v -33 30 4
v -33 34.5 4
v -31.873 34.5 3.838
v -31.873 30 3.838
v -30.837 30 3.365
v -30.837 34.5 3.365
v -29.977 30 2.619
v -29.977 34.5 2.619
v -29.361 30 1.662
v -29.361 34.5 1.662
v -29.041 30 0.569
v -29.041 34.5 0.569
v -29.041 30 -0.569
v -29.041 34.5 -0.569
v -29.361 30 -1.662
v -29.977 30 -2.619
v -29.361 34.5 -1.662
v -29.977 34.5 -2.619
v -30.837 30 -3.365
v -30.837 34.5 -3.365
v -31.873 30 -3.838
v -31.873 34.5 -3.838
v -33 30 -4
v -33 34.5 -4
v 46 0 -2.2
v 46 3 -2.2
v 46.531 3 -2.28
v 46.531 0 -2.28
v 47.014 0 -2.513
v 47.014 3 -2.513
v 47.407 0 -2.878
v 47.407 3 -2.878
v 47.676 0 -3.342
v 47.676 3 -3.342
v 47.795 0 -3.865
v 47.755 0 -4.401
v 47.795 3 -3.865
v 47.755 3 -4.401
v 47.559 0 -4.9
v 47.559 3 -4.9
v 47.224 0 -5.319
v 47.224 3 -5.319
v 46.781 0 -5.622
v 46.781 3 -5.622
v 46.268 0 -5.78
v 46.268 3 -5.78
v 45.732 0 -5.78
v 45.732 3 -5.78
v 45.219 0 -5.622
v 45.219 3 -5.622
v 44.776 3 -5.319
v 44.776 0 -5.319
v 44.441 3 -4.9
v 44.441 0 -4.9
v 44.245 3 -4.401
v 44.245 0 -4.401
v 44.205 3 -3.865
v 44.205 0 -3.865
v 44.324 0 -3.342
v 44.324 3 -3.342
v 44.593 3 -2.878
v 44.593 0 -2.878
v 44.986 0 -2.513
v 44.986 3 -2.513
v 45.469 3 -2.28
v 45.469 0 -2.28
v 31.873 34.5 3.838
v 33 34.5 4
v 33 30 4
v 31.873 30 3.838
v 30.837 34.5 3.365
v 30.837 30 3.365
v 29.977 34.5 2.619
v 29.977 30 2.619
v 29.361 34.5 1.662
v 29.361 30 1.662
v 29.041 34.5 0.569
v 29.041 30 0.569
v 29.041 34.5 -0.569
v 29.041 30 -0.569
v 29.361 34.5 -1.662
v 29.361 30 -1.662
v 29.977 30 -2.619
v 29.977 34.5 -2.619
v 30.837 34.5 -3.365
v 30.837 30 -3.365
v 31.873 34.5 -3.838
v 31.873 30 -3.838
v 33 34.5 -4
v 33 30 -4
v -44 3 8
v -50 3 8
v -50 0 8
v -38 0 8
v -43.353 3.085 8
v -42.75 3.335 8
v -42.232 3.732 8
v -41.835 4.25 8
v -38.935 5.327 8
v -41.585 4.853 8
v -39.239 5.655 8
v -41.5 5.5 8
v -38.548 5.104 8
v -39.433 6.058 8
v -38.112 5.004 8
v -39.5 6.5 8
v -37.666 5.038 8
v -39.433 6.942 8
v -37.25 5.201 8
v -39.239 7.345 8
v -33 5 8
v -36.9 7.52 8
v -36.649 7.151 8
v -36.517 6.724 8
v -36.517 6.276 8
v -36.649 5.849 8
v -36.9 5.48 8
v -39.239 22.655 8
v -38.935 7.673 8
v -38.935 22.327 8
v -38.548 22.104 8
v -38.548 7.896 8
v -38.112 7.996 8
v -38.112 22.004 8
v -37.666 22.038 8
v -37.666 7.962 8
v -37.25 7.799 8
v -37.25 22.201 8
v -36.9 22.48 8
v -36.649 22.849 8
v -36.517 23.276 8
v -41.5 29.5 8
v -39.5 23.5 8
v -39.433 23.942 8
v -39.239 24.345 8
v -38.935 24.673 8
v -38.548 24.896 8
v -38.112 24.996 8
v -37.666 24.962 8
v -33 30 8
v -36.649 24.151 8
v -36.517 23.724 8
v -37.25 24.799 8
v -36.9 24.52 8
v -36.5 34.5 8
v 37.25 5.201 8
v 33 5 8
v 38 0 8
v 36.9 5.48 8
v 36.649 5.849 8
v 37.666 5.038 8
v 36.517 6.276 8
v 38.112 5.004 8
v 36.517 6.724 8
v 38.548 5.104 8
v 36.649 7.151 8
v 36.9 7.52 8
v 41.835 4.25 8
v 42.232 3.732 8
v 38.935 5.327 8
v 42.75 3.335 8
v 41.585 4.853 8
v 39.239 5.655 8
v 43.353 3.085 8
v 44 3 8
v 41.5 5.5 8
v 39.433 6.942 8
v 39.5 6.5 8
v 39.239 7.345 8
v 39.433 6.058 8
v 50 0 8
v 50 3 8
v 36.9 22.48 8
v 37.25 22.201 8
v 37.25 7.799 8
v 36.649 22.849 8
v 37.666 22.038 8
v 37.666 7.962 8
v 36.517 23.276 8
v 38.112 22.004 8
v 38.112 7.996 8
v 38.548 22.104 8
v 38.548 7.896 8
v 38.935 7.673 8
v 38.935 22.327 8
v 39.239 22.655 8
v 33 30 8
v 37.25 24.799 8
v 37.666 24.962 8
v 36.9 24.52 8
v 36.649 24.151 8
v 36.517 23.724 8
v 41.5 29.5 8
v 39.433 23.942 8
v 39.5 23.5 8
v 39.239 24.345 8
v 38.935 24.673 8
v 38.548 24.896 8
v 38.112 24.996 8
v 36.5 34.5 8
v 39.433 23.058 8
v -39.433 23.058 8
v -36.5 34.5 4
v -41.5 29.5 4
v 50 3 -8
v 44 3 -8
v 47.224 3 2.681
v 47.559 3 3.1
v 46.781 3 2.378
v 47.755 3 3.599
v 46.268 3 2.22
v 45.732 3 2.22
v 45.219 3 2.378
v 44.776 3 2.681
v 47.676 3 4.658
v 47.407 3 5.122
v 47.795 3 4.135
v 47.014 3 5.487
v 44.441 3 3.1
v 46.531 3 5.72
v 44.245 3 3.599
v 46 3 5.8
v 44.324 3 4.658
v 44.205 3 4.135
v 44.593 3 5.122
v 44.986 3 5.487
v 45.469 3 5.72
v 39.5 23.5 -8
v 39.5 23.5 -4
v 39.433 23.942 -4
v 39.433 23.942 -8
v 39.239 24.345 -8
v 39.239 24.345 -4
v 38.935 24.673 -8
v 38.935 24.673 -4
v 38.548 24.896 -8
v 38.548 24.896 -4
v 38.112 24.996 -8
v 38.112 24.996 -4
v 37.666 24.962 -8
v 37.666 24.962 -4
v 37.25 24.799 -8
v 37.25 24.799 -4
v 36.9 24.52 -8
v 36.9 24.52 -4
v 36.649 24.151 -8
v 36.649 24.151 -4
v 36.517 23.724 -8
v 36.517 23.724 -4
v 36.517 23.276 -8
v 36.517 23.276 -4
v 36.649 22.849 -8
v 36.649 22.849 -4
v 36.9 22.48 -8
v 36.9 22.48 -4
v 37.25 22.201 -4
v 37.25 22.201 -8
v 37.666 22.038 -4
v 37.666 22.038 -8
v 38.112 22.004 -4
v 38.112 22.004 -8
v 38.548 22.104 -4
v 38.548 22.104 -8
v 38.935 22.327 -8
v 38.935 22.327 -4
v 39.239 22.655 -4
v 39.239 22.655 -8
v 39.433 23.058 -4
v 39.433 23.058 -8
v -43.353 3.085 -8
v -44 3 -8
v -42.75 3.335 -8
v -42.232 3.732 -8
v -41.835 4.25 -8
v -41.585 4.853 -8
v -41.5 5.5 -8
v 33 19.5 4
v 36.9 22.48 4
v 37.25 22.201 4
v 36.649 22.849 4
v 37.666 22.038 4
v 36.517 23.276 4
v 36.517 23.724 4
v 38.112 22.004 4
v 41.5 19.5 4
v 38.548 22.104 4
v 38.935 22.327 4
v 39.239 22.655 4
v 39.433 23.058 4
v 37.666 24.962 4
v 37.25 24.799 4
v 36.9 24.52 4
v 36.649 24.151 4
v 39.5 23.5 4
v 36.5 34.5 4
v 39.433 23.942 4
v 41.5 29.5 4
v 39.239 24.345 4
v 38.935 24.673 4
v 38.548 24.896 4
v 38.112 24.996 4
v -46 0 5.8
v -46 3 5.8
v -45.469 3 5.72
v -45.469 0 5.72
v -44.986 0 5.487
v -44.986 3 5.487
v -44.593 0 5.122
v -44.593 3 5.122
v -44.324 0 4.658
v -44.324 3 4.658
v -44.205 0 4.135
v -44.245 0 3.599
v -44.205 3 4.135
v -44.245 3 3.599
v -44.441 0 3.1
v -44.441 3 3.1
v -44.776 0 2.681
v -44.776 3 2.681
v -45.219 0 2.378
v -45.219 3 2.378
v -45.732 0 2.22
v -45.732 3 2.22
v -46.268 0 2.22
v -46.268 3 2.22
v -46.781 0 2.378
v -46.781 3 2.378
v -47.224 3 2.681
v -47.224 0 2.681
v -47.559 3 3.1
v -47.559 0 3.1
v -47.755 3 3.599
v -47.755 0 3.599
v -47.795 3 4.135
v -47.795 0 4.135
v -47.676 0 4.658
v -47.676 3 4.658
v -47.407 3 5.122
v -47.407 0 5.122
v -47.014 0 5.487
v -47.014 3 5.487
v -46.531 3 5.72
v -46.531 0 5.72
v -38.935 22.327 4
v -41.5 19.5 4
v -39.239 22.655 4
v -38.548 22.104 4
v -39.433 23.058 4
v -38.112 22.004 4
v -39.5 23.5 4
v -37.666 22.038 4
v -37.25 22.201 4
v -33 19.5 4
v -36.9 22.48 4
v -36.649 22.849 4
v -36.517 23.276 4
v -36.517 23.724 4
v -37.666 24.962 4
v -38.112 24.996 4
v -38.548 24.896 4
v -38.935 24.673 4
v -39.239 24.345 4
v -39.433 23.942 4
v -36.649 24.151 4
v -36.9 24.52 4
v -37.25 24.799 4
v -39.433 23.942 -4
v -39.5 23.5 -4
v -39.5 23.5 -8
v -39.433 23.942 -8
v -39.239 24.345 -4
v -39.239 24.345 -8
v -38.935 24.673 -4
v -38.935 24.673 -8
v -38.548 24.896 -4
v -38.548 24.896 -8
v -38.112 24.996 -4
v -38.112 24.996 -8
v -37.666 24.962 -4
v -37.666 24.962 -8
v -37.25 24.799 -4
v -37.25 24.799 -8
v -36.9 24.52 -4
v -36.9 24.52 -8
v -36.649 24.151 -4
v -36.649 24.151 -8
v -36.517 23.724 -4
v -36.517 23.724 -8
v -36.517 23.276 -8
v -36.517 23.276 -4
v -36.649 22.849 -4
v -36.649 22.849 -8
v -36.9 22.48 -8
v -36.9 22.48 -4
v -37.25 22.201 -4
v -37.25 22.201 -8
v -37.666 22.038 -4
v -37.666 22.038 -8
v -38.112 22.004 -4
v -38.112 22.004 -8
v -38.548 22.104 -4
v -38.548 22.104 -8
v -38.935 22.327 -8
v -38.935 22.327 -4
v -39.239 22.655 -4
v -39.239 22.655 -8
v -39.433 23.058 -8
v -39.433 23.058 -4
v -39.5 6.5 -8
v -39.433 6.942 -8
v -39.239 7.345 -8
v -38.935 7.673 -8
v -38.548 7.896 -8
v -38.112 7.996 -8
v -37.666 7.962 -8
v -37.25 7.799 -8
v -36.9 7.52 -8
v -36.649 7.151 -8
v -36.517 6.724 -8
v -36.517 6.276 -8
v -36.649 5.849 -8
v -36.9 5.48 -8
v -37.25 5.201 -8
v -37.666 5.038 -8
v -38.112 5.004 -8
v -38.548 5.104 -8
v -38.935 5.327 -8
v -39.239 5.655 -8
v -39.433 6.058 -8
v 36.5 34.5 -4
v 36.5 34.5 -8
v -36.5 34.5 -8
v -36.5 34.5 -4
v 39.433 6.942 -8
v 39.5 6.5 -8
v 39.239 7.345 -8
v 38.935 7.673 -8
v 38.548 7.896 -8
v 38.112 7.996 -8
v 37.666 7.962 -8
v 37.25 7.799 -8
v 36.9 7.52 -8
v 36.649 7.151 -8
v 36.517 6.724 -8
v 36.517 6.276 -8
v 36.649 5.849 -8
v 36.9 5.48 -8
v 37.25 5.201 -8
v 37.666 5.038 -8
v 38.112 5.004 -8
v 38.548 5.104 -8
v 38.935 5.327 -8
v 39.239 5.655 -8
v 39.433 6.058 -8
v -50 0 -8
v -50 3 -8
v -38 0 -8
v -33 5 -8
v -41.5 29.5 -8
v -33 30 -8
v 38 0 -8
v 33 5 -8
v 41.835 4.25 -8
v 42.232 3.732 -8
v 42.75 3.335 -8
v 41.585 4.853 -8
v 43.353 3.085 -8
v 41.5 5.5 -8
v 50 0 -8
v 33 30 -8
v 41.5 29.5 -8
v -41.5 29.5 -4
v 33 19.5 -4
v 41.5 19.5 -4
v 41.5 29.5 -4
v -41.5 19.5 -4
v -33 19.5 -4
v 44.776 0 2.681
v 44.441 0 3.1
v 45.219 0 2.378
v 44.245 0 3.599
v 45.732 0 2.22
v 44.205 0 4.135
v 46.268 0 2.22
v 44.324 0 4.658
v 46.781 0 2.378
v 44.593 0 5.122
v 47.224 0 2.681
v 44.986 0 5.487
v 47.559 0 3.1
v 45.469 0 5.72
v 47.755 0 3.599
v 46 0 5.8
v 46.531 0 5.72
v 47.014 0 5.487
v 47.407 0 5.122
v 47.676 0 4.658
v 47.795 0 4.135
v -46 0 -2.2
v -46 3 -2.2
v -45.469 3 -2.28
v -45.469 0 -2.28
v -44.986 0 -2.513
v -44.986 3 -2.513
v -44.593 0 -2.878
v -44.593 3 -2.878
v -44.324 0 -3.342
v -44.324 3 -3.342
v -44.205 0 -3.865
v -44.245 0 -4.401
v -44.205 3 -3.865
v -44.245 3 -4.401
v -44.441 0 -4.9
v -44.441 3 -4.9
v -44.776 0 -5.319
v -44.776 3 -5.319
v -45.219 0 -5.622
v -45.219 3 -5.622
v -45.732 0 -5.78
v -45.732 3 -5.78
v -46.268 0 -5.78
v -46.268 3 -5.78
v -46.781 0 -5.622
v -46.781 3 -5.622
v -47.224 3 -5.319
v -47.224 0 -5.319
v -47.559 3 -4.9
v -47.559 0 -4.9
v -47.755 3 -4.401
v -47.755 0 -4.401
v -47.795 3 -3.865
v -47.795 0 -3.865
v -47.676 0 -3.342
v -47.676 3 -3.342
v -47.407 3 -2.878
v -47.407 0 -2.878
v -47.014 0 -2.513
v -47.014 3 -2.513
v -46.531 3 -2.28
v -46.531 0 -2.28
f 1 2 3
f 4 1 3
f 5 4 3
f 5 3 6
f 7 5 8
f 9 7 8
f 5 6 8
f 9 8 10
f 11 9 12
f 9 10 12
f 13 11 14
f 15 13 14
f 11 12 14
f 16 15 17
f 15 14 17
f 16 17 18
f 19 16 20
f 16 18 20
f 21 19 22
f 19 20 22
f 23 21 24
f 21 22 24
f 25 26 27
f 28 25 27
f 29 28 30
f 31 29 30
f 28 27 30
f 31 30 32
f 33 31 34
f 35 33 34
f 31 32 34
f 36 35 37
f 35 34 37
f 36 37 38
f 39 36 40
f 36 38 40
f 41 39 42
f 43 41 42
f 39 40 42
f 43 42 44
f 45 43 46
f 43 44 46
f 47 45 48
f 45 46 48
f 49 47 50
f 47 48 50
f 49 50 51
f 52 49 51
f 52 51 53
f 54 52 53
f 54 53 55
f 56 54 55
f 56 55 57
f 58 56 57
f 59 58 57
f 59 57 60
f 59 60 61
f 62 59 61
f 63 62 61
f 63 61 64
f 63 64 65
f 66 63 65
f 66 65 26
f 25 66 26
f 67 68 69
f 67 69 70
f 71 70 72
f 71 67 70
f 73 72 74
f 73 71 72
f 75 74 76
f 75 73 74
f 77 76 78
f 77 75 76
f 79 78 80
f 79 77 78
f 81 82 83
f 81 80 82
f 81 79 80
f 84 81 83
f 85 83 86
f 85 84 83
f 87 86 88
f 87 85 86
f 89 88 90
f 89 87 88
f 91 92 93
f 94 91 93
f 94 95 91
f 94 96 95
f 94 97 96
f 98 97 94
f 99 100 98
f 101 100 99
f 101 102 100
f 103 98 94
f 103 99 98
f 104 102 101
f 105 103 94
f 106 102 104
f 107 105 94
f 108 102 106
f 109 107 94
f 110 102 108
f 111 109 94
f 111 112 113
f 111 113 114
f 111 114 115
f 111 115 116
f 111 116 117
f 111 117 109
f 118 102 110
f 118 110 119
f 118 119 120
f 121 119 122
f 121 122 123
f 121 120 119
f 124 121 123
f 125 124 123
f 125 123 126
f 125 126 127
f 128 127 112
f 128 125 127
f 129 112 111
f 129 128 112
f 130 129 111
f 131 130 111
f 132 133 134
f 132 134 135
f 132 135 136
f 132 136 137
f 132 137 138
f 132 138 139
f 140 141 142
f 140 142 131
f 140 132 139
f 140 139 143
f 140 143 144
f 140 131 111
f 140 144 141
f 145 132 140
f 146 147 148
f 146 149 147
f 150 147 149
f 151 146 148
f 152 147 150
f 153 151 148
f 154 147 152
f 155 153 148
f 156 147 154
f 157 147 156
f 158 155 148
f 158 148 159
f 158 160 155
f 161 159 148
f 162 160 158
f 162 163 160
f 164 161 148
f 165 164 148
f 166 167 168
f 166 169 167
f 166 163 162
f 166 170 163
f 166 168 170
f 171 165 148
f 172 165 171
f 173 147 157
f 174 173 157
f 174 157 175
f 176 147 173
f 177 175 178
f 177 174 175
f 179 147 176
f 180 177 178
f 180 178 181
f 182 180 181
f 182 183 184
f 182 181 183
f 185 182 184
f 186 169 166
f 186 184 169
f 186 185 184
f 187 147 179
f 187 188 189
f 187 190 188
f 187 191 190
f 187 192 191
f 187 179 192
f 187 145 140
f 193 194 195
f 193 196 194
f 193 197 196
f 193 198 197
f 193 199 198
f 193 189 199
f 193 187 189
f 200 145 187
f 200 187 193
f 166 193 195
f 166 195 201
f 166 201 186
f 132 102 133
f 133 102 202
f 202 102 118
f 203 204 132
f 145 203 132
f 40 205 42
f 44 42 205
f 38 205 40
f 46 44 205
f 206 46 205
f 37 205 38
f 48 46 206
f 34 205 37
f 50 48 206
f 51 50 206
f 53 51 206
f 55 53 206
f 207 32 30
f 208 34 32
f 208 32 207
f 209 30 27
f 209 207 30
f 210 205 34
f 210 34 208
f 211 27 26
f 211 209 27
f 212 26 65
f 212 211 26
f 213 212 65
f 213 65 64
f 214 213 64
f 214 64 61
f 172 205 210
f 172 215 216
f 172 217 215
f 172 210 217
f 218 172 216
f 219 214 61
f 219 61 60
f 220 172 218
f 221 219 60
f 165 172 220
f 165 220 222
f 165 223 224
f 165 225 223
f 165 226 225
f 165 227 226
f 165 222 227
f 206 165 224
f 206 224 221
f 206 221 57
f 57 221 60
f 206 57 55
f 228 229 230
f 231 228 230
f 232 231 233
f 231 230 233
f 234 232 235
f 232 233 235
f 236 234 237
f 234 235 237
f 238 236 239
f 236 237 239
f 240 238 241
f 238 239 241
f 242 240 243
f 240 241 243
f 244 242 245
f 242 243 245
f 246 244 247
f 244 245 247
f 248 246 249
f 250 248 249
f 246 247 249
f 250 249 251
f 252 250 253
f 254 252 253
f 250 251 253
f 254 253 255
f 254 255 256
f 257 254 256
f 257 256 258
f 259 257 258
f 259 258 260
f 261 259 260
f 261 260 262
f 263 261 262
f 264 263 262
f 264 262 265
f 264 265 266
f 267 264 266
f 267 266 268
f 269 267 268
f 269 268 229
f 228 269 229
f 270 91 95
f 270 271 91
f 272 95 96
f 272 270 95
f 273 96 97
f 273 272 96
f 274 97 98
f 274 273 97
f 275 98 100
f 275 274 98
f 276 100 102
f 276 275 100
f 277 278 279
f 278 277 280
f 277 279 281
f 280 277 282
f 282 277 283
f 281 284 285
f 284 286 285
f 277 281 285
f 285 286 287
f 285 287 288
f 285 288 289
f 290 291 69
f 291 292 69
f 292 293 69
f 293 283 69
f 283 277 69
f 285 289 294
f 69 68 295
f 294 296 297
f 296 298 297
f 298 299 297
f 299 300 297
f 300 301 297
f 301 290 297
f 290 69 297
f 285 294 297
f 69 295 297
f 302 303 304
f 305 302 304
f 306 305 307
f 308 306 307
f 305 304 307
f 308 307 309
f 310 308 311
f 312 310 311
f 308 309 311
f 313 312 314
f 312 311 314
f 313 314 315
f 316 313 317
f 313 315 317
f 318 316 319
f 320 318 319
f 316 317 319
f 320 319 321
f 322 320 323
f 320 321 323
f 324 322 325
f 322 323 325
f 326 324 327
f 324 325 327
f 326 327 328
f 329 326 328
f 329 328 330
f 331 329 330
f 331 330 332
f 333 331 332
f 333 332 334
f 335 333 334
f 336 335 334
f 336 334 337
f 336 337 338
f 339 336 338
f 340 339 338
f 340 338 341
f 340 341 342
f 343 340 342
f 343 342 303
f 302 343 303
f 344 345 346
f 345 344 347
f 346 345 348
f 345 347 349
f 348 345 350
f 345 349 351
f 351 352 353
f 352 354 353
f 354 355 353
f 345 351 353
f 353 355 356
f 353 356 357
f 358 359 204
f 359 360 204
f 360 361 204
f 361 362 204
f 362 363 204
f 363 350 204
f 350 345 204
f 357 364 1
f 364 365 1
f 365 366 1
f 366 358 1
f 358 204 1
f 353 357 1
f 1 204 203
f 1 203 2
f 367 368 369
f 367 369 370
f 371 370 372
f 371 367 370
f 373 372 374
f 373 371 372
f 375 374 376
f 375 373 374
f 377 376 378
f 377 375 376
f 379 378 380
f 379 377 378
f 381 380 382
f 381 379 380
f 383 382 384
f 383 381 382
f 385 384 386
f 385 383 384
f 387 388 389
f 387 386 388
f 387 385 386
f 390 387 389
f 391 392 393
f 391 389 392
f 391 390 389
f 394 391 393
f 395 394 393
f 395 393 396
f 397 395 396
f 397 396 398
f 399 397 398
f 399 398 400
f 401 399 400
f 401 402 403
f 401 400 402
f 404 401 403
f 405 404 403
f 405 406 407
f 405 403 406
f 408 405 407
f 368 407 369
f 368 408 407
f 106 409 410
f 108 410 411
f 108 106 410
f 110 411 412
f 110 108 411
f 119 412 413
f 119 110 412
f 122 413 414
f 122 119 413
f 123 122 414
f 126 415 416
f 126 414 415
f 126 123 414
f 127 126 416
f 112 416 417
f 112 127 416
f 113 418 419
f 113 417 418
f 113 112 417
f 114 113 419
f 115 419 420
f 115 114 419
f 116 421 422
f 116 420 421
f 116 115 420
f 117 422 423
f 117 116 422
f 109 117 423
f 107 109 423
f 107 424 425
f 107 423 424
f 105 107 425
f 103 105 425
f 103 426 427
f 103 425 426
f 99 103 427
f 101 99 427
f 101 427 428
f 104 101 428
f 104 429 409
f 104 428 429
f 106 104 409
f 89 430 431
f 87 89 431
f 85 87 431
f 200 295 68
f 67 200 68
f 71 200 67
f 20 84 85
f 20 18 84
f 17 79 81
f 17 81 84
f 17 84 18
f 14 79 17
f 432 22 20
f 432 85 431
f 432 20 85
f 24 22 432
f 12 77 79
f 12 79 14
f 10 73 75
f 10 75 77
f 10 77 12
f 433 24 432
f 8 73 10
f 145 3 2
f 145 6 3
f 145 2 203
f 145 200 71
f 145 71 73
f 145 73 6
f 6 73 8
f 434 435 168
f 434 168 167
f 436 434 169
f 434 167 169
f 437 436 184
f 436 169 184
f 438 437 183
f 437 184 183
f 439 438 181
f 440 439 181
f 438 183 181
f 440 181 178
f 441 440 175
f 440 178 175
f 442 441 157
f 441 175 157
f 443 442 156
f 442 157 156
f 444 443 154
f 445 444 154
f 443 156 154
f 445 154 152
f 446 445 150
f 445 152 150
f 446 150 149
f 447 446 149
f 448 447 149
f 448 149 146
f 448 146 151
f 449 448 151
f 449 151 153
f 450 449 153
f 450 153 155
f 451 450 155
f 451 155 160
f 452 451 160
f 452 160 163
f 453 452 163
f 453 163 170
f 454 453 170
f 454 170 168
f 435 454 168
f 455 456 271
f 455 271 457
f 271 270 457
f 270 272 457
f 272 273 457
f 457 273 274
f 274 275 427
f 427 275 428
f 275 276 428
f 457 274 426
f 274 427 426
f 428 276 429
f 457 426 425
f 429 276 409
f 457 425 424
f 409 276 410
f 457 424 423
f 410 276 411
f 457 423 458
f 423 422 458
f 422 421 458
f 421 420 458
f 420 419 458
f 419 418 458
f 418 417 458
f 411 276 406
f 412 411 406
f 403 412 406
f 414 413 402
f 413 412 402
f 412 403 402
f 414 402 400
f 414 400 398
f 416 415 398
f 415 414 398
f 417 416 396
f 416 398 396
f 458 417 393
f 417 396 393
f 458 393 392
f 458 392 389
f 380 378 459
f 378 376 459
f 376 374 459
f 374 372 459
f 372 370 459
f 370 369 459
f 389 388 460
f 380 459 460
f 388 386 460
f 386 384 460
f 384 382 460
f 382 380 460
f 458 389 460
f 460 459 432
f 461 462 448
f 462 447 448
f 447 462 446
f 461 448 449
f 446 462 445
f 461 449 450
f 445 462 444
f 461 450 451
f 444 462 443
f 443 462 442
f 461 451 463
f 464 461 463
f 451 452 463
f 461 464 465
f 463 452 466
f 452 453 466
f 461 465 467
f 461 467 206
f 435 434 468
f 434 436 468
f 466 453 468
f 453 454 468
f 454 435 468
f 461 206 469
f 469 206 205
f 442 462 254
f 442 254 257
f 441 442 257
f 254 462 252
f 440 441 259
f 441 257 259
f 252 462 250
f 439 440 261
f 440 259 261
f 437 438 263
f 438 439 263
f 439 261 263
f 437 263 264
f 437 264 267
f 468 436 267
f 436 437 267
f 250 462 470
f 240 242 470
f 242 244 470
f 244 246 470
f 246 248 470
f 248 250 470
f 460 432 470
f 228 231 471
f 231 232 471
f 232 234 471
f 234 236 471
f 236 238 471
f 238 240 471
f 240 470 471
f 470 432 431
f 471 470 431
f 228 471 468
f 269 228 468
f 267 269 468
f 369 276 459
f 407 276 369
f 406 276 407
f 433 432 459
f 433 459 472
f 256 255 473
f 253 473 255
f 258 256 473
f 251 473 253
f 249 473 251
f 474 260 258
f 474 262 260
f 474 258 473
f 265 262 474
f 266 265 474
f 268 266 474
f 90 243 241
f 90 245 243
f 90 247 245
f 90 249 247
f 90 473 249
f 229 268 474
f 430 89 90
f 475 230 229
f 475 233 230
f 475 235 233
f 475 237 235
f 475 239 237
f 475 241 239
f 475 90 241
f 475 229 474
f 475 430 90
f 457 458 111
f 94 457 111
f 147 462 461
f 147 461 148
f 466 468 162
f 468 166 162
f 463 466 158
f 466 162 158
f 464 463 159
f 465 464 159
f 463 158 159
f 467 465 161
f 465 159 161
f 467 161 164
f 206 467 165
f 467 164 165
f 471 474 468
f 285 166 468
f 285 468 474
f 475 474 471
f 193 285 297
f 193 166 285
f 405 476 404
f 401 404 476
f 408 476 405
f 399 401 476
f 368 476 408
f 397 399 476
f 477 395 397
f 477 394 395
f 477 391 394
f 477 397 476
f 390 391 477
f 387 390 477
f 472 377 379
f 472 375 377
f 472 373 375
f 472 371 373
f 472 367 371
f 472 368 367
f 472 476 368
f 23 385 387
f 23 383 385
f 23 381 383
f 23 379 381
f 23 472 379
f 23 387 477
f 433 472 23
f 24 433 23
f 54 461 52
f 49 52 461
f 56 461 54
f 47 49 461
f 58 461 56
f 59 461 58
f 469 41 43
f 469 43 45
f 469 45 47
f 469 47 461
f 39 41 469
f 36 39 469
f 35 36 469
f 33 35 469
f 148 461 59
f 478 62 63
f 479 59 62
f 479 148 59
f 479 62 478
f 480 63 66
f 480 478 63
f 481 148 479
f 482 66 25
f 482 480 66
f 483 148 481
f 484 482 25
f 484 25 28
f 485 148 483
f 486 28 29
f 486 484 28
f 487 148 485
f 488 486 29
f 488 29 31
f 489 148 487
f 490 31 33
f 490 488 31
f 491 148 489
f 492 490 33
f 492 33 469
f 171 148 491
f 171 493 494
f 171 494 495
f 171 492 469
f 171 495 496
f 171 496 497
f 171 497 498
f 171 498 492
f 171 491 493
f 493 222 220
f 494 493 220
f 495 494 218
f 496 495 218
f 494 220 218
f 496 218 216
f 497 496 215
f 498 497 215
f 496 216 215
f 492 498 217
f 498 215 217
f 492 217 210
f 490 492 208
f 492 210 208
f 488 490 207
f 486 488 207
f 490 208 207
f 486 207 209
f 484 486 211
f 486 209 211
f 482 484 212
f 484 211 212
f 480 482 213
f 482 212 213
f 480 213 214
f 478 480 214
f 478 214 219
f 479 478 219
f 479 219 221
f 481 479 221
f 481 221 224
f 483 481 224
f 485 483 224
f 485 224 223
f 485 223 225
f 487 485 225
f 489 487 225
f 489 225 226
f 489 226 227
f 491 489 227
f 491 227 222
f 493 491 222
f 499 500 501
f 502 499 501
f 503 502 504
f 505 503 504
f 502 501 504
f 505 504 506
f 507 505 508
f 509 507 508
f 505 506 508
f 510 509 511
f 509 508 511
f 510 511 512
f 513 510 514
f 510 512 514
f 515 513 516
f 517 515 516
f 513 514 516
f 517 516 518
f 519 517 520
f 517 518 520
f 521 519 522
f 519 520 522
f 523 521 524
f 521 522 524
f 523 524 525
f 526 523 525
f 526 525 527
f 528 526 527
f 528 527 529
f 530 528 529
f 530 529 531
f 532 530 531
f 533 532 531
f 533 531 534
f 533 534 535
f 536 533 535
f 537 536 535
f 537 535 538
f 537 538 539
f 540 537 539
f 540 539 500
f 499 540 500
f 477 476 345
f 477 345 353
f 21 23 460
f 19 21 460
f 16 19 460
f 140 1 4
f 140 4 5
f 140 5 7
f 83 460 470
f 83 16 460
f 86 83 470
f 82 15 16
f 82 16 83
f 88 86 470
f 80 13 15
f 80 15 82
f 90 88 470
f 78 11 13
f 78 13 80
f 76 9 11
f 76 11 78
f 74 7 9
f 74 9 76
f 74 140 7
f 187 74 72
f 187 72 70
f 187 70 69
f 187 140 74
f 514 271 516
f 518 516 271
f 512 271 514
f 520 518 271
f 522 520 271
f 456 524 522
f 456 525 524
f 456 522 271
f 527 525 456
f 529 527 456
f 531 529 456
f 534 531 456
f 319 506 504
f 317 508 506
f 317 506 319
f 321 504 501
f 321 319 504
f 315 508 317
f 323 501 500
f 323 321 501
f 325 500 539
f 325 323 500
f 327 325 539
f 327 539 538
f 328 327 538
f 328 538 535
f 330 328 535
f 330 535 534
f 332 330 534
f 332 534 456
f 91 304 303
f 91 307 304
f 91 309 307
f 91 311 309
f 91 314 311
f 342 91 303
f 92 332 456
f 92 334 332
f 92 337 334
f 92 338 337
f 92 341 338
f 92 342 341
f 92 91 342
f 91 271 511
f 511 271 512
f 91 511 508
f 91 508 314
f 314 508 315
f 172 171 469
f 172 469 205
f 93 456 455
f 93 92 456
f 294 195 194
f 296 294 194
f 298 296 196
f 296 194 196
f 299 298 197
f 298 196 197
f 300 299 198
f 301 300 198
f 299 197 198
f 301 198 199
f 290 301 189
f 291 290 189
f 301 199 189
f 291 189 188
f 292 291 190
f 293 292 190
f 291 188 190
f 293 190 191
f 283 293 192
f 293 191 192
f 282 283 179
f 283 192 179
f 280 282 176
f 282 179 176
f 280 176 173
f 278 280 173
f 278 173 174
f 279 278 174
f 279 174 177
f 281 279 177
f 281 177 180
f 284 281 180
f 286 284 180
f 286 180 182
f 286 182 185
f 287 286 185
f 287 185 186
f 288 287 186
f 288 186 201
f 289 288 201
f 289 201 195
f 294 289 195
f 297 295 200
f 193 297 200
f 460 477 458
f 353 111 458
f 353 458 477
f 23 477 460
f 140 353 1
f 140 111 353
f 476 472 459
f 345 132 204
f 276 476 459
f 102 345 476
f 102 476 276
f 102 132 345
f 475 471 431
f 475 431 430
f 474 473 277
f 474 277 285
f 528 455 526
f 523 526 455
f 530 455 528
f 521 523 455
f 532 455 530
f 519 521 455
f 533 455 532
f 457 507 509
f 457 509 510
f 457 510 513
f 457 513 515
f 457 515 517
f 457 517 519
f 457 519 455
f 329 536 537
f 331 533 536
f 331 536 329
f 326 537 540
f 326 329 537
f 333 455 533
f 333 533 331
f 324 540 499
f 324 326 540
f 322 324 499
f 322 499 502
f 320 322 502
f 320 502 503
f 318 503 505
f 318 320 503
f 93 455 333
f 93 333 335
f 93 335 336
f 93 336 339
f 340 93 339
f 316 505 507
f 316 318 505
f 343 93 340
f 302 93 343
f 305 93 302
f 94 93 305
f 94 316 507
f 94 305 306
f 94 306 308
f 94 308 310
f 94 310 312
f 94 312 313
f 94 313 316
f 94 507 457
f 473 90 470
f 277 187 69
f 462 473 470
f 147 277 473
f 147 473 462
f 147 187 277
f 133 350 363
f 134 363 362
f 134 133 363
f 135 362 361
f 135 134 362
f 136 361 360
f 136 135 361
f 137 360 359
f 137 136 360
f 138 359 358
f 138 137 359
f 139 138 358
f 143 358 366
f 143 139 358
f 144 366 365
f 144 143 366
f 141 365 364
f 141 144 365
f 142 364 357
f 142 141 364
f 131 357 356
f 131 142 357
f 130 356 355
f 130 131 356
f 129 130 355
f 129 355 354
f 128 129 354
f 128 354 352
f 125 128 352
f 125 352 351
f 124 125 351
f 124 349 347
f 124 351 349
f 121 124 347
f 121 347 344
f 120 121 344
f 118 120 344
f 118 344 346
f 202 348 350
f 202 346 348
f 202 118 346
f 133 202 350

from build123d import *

# Parameters (mm, degrees)
BOSS_EXTRUDE1_DEPTH = 8
CHAMFER5_SIZE       = 5
FILLET1_R           = 2.5
SKETCH2_R           = 1.5
CUT_EXTRUDE1_DEPTH  = 63.819184968
SKETCH3_R           = 1.8
CUT_EXTRUDE2_DEPTH  = 60.634302209
SKETCH5_W           = 8.5
SKETCH5_H           = 8
CUT_EXTRUDE3_DEPTH  = 15
CUT_EXTRUDE5_DEPTH  = 15


with BuildPart() as part:
    # Sketch1 → Boss-Extrude1 (new, symmetric)
    with BuildSketch(Plane.XY):
        Polygon((-50, 0), (-33, 0), (-33, 30), (33, 30), (33, 0), (50, 0), (50, 3), (41.5, 3), (41.5, 34.5), (-41.5, 34.5), (-41.5, 3), (-50, 3), align=None)
    extrude(amount=BOSS_EXTRUDE1_DEPTH, both=True)

    # Chamfer5
    chamfer5_edges = [part.edges().sort_by_distance(p)[0] for p in [
        (-41.5, 34.5, 0),
        (41.5, 34.5, 0),
        (33, 0, 0),
        (-33, 0, 0),
    ]]
    chamfer(chamfer5_edges, length=CHAMFER5_SIZE)

    # Fillet1
    fillet1_edges = [part.edges().sort_by_distance(p)[0] for p in [
        (-41.5, 3, 0),
        (41.5, 3, 0),
    ]]
    fillet(fillet1_edges, radius=FILLET1_R)

    # Sketch2 → Cut-Extrude1 (cut, through all)
    with BuildSketch(Plane.XY.offset(8)):
        with Locations((38, 23.5)):
            Circle(SKETCH2_R)
        with Locations((38, 6.5)):
            Circle(SKETCH2_R)
    cut_extrude1 = extrude(amount=-CUT_EXTRUDE1_DEPTH, mode=Mode.SUBTRACT)

    # Mirror1: Cut-Extrude1 across plane
    add(cut_extrude1.mirror(Plane(origin=(0, 0, 0), x_dir=(0, 0, 1), z_dir=(1, 0, 0))), mode=Mode.SUBTRACT)

    # Sketch3 → Cut-Extrude2 (cut, through all)
    with BuildSketch(Plane(origin=(0, 3, 0), x_dir=(1, 0, 0), z_dir=(0, 1, 0))):
        with Locations(Location((46, 4, 0), (0, 0, 270))):
            Circle(SKETCH3_R)
        with Locations(Location((46, -4, 0), (0, 0, 270))):
            Circle(SKETCH3_R)
        with Locations(Location((-46, 4, 0), (0, 0, 270))):
            Circle(SKETCH3_R)
        with Locations(Location((-46, -4, 0), (0, 0, 270))):
            Circle(SKETCH3_R)
    extrude(amount=-CUT_EXTRUDE2_DEPTH, mode=Mode.SUBTRACT)

    # Sketch5 → Cut-Extrude3 (cut)
    with BuildSketch(Plane(origin=(0, 34.5, 0), x_dir=(1, 0, 0), z_dir=(0, 1, 0))):
        with Locations((37.25, 0)):
            Rectangle(SKETCH5_W, SKETCH5_H)
        with Locations((-37.25, 0)):
            Rectangle(SKETCH5_W, SKETCH5_H)
    extrude(amount=-CUT_EXTRUDE3_DEPTH, mode=Mode.SUBTRACT)

    # Sketch7 → Cut-Extrude5 (cut)
    with BuildSketch(Plane(origin=(0, 34.5, 0), x_dir=(1, 0, 0), z_dir=(0, 1, 0))):
        with BuildLine():
            Line((33, 4), (33, -4))
            ThreePointArc((33, -4), (29, 0), (33, 4))
        make_face()
        with BuildLine():
            Line((-33, 4), (-33, -4))
            ThreePointArc((-33, -4), (-29, 0), (-33, 4))
        make_face()
    extrude(amount=-CUT_EXTRUDE5_DEPTH, mode=Mode.SUBTRACT)


solid = part.part
